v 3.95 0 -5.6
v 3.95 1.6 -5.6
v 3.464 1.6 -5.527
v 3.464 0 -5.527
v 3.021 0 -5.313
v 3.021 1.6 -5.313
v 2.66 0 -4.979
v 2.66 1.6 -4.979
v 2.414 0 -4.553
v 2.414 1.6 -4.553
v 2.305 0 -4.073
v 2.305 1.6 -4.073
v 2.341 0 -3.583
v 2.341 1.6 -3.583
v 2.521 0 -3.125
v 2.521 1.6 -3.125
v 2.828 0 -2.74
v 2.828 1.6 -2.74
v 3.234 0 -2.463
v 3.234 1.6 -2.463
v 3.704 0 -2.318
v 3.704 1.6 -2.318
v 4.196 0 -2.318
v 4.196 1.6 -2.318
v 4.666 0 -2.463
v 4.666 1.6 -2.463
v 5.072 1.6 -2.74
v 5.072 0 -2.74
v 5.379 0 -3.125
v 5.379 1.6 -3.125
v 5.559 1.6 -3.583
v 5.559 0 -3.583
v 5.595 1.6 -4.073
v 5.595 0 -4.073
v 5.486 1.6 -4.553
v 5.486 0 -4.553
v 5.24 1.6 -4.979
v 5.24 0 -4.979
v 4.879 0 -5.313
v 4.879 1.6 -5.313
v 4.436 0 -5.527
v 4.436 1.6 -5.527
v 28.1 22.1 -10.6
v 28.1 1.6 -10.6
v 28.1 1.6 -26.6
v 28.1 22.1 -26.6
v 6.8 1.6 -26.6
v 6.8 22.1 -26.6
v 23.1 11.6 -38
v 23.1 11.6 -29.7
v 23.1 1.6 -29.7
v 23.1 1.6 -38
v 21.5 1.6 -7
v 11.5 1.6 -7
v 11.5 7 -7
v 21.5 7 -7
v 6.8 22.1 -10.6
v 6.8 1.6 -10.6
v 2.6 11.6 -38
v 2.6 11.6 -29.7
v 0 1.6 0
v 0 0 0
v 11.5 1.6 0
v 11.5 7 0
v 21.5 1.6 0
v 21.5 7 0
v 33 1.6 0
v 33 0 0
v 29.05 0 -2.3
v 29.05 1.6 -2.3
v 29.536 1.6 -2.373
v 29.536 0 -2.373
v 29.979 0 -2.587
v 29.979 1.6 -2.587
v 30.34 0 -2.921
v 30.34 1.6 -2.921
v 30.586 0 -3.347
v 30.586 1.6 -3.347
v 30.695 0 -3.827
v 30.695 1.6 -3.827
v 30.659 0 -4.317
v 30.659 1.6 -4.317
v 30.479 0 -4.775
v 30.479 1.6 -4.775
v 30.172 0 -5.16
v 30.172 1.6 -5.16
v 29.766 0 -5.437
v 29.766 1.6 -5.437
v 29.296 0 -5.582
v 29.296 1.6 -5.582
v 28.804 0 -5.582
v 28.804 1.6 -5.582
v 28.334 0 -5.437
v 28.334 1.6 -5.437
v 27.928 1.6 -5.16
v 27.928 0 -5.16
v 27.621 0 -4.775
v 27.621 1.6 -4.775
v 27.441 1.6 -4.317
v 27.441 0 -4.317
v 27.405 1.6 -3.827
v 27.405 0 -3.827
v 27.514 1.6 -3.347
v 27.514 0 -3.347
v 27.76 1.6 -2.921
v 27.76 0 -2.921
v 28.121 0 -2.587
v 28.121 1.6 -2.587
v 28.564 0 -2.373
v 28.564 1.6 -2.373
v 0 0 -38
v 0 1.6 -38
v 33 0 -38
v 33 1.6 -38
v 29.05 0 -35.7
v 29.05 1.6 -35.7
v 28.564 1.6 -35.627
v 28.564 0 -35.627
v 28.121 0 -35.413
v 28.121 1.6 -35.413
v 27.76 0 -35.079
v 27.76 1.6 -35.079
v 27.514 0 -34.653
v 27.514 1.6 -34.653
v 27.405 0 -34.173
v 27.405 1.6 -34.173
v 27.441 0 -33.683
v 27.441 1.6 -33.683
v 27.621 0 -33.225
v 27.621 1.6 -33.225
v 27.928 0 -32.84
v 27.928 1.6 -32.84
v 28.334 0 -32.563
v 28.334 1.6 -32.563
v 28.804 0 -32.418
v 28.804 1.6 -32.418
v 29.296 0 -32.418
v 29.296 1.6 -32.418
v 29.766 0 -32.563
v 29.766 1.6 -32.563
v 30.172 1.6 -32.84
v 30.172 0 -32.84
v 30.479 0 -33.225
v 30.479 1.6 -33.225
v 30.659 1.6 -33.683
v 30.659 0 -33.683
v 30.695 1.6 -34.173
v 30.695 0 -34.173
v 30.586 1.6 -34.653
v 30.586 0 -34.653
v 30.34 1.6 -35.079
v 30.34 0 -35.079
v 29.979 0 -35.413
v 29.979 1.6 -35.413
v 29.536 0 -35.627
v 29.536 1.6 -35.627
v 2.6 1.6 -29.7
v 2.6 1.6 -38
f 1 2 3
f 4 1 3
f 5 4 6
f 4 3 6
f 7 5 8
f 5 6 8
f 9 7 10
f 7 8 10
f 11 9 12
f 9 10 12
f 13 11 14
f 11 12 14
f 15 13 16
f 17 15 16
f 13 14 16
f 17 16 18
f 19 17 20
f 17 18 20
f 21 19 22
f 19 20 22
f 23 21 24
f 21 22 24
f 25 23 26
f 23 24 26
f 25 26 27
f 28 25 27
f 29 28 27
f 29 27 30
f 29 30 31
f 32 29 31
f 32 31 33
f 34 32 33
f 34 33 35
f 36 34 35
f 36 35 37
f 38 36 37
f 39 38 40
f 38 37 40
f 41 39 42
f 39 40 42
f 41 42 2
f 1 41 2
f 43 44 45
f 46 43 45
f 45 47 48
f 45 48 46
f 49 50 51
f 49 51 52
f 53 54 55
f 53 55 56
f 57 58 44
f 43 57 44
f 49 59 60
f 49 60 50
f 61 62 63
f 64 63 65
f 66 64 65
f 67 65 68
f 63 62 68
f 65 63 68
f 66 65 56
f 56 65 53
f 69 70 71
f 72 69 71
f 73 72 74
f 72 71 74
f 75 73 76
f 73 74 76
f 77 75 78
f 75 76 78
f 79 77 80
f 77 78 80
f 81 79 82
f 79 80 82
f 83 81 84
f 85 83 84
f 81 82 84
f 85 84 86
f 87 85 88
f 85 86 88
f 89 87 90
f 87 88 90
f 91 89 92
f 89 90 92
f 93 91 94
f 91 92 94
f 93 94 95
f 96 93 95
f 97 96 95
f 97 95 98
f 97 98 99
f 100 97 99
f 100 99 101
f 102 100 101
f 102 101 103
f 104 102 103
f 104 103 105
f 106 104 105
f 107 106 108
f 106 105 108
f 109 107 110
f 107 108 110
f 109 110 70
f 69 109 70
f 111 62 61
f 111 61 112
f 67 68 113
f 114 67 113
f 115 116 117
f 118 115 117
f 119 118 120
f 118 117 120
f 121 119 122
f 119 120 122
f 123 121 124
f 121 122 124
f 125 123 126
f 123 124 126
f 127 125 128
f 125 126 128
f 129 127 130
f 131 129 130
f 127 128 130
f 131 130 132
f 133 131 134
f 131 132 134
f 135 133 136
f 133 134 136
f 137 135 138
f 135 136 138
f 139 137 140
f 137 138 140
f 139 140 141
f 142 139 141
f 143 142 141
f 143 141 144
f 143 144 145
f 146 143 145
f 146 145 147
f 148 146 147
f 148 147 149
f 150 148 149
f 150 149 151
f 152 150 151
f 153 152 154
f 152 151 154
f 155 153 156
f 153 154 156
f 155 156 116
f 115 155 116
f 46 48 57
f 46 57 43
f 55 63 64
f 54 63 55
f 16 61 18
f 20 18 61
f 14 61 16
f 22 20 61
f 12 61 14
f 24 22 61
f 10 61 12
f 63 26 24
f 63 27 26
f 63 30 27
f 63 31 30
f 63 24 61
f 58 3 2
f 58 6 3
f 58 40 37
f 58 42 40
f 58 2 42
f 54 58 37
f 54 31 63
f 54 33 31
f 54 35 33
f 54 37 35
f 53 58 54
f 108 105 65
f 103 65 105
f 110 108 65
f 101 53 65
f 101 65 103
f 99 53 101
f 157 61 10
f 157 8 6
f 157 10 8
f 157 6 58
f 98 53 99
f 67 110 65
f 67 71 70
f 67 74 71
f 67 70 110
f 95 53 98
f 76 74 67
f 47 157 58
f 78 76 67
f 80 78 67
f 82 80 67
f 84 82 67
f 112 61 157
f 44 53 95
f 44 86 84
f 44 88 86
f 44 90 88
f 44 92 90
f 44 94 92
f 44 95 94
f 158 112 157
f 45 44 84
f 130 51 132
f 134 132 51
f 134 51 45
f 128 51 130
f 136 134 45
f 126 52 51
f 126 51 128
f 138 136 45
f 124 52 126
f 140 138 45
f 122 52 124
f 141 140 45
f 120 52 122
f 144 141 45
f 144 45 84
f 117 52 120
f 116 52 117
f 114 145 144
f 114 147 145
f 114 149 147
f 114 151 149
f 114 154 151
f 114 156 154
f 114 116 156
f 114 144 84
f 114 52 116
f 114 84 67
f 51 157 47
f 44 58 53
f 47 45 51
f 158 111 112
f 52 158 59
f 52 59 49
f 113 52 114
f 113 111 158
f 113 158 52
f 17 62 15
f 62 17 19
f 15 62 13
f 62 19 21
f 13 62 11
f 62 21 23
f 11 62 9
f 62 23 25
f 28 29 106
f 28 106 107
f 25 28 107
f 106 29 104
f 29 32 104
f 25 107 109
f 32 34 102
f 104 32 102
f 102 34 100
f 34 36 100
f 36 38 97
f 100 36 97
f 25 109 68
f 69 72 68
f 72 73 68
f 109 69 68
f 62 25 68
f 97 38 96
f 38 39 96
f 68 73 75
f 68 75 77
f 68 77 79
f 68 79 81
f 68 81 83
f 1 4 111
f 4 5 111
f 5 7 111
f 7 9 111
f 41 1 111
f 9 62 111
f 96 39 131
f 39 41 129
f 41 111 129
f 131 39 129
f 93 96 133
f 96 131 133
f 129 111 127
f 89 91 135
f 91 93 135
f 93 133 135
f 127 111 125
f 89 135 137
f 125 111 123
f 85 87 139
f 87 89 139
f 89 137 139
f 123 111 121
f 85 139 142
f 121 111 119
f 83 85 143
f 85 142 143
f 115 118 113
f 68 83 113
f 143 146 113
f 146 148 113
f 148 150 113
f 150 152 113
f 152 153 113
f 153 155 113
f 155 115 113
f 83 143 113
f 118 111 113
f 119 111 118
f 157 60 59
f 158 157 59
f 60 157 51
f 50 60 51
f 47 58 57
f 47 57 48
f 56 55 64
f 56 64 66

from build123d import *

# Parameters (mm, degrees)
SKETCH1_W           = 33
SKETCH1_H           = 38
BOSS_EXTRUDE1_DEPTH = 1.6
SKETCH2_R           = 1.65
CUT_EXTRUDE1_DEPTH  = 1.6
SKETCH3_W           = 10
SKETCH3_H           = 7
BOSS_EXTRUDE2_DEPTH = 5.4
SKETCH4_W           = 21.3
SKETCH4_H           = 16
BOSS_EXTRUDE3_DEPTH = 20.5
SKETCH5_W           = 20.5
SKETCH5_H           = 8.3
BOSS_EXTRUDE4_DEPTH = 10


with BuildPart() as part:
    # Sketch1 → Boss-Extrude1 (new body)
    with BuildSketch(Plane(origin=(0, 0, 0), x_dir=(1, 0, 0), z_dir=(0, 1, 0))):
        with Locations((16.5, 19)):
            Rectangle(SKETCH1_W, SKETCH1_H)
    extrude(amount=BOSS_EXTRUDE1_DEPTH)

    # Sketch2 → Cut-Extrude1 (cut)
    with BuildSketch(Plane(origin=(0, 1.6, 0), x_dir=(1, 0, 0), z_dir=(0, 1, 0))):
        with Locations(Location((29.05, 3.95, 0), (0, 0, 270))):
            Circle(SKETCH2_R)
        with Locations(Location((3.95, 3.95, 0), (0, 0, 90))):
            Circle(SKETCH2_R)
        with Locations(Location((29.05, 34.05, 0), (0, 0, 90))):
            Circle(SKETCH2_R)
    extrude(amount=-CUT_EXTRUDE1_DEPTH, mode=Mode.SUBTRACT)

    # Sketch3 → Boss-Extrude2 (add)
    with BuildSketch(Plane(origin=(0, 1.6, 0), x_dir=(1, 0, 0), z_dir=(0, 1, 0))):
        with Locations((16.5, 3.5)):
            Rectangle(SKETCH3_W, SKETCH3_H)
    extrude(amount=BOSS_EXTRUDE2_DEPTH)

    # Sketch4 → Boss-Extrude3 (add)
    with BuildSketch(Plane(origin=(0, 1.6, 0), x_dir=(1, 0, 0), z_dir=(0, 1, 0))):
        with Locations((17.45, 18.6)):
            Rectangle(SKETCH4_W, SKETCH4_H)
    extrude(amount=BOSS_EXTRUDE3_DEPTH)

    # Sketch5 → Boss-Extrude4 (add)
    with BuildSketch(Plane(origin=(0, 1.6, 0), x_dir=(1, 0, 0), z_dir=(0, 1, 0))):
        with Locations((12.85, 33.85)):
            Rectangle(SKETCH5_W, SKETCH5_H)
    extrude(amount=BOSS_EXTRUDE4_DEPTH)


solid = part.part
